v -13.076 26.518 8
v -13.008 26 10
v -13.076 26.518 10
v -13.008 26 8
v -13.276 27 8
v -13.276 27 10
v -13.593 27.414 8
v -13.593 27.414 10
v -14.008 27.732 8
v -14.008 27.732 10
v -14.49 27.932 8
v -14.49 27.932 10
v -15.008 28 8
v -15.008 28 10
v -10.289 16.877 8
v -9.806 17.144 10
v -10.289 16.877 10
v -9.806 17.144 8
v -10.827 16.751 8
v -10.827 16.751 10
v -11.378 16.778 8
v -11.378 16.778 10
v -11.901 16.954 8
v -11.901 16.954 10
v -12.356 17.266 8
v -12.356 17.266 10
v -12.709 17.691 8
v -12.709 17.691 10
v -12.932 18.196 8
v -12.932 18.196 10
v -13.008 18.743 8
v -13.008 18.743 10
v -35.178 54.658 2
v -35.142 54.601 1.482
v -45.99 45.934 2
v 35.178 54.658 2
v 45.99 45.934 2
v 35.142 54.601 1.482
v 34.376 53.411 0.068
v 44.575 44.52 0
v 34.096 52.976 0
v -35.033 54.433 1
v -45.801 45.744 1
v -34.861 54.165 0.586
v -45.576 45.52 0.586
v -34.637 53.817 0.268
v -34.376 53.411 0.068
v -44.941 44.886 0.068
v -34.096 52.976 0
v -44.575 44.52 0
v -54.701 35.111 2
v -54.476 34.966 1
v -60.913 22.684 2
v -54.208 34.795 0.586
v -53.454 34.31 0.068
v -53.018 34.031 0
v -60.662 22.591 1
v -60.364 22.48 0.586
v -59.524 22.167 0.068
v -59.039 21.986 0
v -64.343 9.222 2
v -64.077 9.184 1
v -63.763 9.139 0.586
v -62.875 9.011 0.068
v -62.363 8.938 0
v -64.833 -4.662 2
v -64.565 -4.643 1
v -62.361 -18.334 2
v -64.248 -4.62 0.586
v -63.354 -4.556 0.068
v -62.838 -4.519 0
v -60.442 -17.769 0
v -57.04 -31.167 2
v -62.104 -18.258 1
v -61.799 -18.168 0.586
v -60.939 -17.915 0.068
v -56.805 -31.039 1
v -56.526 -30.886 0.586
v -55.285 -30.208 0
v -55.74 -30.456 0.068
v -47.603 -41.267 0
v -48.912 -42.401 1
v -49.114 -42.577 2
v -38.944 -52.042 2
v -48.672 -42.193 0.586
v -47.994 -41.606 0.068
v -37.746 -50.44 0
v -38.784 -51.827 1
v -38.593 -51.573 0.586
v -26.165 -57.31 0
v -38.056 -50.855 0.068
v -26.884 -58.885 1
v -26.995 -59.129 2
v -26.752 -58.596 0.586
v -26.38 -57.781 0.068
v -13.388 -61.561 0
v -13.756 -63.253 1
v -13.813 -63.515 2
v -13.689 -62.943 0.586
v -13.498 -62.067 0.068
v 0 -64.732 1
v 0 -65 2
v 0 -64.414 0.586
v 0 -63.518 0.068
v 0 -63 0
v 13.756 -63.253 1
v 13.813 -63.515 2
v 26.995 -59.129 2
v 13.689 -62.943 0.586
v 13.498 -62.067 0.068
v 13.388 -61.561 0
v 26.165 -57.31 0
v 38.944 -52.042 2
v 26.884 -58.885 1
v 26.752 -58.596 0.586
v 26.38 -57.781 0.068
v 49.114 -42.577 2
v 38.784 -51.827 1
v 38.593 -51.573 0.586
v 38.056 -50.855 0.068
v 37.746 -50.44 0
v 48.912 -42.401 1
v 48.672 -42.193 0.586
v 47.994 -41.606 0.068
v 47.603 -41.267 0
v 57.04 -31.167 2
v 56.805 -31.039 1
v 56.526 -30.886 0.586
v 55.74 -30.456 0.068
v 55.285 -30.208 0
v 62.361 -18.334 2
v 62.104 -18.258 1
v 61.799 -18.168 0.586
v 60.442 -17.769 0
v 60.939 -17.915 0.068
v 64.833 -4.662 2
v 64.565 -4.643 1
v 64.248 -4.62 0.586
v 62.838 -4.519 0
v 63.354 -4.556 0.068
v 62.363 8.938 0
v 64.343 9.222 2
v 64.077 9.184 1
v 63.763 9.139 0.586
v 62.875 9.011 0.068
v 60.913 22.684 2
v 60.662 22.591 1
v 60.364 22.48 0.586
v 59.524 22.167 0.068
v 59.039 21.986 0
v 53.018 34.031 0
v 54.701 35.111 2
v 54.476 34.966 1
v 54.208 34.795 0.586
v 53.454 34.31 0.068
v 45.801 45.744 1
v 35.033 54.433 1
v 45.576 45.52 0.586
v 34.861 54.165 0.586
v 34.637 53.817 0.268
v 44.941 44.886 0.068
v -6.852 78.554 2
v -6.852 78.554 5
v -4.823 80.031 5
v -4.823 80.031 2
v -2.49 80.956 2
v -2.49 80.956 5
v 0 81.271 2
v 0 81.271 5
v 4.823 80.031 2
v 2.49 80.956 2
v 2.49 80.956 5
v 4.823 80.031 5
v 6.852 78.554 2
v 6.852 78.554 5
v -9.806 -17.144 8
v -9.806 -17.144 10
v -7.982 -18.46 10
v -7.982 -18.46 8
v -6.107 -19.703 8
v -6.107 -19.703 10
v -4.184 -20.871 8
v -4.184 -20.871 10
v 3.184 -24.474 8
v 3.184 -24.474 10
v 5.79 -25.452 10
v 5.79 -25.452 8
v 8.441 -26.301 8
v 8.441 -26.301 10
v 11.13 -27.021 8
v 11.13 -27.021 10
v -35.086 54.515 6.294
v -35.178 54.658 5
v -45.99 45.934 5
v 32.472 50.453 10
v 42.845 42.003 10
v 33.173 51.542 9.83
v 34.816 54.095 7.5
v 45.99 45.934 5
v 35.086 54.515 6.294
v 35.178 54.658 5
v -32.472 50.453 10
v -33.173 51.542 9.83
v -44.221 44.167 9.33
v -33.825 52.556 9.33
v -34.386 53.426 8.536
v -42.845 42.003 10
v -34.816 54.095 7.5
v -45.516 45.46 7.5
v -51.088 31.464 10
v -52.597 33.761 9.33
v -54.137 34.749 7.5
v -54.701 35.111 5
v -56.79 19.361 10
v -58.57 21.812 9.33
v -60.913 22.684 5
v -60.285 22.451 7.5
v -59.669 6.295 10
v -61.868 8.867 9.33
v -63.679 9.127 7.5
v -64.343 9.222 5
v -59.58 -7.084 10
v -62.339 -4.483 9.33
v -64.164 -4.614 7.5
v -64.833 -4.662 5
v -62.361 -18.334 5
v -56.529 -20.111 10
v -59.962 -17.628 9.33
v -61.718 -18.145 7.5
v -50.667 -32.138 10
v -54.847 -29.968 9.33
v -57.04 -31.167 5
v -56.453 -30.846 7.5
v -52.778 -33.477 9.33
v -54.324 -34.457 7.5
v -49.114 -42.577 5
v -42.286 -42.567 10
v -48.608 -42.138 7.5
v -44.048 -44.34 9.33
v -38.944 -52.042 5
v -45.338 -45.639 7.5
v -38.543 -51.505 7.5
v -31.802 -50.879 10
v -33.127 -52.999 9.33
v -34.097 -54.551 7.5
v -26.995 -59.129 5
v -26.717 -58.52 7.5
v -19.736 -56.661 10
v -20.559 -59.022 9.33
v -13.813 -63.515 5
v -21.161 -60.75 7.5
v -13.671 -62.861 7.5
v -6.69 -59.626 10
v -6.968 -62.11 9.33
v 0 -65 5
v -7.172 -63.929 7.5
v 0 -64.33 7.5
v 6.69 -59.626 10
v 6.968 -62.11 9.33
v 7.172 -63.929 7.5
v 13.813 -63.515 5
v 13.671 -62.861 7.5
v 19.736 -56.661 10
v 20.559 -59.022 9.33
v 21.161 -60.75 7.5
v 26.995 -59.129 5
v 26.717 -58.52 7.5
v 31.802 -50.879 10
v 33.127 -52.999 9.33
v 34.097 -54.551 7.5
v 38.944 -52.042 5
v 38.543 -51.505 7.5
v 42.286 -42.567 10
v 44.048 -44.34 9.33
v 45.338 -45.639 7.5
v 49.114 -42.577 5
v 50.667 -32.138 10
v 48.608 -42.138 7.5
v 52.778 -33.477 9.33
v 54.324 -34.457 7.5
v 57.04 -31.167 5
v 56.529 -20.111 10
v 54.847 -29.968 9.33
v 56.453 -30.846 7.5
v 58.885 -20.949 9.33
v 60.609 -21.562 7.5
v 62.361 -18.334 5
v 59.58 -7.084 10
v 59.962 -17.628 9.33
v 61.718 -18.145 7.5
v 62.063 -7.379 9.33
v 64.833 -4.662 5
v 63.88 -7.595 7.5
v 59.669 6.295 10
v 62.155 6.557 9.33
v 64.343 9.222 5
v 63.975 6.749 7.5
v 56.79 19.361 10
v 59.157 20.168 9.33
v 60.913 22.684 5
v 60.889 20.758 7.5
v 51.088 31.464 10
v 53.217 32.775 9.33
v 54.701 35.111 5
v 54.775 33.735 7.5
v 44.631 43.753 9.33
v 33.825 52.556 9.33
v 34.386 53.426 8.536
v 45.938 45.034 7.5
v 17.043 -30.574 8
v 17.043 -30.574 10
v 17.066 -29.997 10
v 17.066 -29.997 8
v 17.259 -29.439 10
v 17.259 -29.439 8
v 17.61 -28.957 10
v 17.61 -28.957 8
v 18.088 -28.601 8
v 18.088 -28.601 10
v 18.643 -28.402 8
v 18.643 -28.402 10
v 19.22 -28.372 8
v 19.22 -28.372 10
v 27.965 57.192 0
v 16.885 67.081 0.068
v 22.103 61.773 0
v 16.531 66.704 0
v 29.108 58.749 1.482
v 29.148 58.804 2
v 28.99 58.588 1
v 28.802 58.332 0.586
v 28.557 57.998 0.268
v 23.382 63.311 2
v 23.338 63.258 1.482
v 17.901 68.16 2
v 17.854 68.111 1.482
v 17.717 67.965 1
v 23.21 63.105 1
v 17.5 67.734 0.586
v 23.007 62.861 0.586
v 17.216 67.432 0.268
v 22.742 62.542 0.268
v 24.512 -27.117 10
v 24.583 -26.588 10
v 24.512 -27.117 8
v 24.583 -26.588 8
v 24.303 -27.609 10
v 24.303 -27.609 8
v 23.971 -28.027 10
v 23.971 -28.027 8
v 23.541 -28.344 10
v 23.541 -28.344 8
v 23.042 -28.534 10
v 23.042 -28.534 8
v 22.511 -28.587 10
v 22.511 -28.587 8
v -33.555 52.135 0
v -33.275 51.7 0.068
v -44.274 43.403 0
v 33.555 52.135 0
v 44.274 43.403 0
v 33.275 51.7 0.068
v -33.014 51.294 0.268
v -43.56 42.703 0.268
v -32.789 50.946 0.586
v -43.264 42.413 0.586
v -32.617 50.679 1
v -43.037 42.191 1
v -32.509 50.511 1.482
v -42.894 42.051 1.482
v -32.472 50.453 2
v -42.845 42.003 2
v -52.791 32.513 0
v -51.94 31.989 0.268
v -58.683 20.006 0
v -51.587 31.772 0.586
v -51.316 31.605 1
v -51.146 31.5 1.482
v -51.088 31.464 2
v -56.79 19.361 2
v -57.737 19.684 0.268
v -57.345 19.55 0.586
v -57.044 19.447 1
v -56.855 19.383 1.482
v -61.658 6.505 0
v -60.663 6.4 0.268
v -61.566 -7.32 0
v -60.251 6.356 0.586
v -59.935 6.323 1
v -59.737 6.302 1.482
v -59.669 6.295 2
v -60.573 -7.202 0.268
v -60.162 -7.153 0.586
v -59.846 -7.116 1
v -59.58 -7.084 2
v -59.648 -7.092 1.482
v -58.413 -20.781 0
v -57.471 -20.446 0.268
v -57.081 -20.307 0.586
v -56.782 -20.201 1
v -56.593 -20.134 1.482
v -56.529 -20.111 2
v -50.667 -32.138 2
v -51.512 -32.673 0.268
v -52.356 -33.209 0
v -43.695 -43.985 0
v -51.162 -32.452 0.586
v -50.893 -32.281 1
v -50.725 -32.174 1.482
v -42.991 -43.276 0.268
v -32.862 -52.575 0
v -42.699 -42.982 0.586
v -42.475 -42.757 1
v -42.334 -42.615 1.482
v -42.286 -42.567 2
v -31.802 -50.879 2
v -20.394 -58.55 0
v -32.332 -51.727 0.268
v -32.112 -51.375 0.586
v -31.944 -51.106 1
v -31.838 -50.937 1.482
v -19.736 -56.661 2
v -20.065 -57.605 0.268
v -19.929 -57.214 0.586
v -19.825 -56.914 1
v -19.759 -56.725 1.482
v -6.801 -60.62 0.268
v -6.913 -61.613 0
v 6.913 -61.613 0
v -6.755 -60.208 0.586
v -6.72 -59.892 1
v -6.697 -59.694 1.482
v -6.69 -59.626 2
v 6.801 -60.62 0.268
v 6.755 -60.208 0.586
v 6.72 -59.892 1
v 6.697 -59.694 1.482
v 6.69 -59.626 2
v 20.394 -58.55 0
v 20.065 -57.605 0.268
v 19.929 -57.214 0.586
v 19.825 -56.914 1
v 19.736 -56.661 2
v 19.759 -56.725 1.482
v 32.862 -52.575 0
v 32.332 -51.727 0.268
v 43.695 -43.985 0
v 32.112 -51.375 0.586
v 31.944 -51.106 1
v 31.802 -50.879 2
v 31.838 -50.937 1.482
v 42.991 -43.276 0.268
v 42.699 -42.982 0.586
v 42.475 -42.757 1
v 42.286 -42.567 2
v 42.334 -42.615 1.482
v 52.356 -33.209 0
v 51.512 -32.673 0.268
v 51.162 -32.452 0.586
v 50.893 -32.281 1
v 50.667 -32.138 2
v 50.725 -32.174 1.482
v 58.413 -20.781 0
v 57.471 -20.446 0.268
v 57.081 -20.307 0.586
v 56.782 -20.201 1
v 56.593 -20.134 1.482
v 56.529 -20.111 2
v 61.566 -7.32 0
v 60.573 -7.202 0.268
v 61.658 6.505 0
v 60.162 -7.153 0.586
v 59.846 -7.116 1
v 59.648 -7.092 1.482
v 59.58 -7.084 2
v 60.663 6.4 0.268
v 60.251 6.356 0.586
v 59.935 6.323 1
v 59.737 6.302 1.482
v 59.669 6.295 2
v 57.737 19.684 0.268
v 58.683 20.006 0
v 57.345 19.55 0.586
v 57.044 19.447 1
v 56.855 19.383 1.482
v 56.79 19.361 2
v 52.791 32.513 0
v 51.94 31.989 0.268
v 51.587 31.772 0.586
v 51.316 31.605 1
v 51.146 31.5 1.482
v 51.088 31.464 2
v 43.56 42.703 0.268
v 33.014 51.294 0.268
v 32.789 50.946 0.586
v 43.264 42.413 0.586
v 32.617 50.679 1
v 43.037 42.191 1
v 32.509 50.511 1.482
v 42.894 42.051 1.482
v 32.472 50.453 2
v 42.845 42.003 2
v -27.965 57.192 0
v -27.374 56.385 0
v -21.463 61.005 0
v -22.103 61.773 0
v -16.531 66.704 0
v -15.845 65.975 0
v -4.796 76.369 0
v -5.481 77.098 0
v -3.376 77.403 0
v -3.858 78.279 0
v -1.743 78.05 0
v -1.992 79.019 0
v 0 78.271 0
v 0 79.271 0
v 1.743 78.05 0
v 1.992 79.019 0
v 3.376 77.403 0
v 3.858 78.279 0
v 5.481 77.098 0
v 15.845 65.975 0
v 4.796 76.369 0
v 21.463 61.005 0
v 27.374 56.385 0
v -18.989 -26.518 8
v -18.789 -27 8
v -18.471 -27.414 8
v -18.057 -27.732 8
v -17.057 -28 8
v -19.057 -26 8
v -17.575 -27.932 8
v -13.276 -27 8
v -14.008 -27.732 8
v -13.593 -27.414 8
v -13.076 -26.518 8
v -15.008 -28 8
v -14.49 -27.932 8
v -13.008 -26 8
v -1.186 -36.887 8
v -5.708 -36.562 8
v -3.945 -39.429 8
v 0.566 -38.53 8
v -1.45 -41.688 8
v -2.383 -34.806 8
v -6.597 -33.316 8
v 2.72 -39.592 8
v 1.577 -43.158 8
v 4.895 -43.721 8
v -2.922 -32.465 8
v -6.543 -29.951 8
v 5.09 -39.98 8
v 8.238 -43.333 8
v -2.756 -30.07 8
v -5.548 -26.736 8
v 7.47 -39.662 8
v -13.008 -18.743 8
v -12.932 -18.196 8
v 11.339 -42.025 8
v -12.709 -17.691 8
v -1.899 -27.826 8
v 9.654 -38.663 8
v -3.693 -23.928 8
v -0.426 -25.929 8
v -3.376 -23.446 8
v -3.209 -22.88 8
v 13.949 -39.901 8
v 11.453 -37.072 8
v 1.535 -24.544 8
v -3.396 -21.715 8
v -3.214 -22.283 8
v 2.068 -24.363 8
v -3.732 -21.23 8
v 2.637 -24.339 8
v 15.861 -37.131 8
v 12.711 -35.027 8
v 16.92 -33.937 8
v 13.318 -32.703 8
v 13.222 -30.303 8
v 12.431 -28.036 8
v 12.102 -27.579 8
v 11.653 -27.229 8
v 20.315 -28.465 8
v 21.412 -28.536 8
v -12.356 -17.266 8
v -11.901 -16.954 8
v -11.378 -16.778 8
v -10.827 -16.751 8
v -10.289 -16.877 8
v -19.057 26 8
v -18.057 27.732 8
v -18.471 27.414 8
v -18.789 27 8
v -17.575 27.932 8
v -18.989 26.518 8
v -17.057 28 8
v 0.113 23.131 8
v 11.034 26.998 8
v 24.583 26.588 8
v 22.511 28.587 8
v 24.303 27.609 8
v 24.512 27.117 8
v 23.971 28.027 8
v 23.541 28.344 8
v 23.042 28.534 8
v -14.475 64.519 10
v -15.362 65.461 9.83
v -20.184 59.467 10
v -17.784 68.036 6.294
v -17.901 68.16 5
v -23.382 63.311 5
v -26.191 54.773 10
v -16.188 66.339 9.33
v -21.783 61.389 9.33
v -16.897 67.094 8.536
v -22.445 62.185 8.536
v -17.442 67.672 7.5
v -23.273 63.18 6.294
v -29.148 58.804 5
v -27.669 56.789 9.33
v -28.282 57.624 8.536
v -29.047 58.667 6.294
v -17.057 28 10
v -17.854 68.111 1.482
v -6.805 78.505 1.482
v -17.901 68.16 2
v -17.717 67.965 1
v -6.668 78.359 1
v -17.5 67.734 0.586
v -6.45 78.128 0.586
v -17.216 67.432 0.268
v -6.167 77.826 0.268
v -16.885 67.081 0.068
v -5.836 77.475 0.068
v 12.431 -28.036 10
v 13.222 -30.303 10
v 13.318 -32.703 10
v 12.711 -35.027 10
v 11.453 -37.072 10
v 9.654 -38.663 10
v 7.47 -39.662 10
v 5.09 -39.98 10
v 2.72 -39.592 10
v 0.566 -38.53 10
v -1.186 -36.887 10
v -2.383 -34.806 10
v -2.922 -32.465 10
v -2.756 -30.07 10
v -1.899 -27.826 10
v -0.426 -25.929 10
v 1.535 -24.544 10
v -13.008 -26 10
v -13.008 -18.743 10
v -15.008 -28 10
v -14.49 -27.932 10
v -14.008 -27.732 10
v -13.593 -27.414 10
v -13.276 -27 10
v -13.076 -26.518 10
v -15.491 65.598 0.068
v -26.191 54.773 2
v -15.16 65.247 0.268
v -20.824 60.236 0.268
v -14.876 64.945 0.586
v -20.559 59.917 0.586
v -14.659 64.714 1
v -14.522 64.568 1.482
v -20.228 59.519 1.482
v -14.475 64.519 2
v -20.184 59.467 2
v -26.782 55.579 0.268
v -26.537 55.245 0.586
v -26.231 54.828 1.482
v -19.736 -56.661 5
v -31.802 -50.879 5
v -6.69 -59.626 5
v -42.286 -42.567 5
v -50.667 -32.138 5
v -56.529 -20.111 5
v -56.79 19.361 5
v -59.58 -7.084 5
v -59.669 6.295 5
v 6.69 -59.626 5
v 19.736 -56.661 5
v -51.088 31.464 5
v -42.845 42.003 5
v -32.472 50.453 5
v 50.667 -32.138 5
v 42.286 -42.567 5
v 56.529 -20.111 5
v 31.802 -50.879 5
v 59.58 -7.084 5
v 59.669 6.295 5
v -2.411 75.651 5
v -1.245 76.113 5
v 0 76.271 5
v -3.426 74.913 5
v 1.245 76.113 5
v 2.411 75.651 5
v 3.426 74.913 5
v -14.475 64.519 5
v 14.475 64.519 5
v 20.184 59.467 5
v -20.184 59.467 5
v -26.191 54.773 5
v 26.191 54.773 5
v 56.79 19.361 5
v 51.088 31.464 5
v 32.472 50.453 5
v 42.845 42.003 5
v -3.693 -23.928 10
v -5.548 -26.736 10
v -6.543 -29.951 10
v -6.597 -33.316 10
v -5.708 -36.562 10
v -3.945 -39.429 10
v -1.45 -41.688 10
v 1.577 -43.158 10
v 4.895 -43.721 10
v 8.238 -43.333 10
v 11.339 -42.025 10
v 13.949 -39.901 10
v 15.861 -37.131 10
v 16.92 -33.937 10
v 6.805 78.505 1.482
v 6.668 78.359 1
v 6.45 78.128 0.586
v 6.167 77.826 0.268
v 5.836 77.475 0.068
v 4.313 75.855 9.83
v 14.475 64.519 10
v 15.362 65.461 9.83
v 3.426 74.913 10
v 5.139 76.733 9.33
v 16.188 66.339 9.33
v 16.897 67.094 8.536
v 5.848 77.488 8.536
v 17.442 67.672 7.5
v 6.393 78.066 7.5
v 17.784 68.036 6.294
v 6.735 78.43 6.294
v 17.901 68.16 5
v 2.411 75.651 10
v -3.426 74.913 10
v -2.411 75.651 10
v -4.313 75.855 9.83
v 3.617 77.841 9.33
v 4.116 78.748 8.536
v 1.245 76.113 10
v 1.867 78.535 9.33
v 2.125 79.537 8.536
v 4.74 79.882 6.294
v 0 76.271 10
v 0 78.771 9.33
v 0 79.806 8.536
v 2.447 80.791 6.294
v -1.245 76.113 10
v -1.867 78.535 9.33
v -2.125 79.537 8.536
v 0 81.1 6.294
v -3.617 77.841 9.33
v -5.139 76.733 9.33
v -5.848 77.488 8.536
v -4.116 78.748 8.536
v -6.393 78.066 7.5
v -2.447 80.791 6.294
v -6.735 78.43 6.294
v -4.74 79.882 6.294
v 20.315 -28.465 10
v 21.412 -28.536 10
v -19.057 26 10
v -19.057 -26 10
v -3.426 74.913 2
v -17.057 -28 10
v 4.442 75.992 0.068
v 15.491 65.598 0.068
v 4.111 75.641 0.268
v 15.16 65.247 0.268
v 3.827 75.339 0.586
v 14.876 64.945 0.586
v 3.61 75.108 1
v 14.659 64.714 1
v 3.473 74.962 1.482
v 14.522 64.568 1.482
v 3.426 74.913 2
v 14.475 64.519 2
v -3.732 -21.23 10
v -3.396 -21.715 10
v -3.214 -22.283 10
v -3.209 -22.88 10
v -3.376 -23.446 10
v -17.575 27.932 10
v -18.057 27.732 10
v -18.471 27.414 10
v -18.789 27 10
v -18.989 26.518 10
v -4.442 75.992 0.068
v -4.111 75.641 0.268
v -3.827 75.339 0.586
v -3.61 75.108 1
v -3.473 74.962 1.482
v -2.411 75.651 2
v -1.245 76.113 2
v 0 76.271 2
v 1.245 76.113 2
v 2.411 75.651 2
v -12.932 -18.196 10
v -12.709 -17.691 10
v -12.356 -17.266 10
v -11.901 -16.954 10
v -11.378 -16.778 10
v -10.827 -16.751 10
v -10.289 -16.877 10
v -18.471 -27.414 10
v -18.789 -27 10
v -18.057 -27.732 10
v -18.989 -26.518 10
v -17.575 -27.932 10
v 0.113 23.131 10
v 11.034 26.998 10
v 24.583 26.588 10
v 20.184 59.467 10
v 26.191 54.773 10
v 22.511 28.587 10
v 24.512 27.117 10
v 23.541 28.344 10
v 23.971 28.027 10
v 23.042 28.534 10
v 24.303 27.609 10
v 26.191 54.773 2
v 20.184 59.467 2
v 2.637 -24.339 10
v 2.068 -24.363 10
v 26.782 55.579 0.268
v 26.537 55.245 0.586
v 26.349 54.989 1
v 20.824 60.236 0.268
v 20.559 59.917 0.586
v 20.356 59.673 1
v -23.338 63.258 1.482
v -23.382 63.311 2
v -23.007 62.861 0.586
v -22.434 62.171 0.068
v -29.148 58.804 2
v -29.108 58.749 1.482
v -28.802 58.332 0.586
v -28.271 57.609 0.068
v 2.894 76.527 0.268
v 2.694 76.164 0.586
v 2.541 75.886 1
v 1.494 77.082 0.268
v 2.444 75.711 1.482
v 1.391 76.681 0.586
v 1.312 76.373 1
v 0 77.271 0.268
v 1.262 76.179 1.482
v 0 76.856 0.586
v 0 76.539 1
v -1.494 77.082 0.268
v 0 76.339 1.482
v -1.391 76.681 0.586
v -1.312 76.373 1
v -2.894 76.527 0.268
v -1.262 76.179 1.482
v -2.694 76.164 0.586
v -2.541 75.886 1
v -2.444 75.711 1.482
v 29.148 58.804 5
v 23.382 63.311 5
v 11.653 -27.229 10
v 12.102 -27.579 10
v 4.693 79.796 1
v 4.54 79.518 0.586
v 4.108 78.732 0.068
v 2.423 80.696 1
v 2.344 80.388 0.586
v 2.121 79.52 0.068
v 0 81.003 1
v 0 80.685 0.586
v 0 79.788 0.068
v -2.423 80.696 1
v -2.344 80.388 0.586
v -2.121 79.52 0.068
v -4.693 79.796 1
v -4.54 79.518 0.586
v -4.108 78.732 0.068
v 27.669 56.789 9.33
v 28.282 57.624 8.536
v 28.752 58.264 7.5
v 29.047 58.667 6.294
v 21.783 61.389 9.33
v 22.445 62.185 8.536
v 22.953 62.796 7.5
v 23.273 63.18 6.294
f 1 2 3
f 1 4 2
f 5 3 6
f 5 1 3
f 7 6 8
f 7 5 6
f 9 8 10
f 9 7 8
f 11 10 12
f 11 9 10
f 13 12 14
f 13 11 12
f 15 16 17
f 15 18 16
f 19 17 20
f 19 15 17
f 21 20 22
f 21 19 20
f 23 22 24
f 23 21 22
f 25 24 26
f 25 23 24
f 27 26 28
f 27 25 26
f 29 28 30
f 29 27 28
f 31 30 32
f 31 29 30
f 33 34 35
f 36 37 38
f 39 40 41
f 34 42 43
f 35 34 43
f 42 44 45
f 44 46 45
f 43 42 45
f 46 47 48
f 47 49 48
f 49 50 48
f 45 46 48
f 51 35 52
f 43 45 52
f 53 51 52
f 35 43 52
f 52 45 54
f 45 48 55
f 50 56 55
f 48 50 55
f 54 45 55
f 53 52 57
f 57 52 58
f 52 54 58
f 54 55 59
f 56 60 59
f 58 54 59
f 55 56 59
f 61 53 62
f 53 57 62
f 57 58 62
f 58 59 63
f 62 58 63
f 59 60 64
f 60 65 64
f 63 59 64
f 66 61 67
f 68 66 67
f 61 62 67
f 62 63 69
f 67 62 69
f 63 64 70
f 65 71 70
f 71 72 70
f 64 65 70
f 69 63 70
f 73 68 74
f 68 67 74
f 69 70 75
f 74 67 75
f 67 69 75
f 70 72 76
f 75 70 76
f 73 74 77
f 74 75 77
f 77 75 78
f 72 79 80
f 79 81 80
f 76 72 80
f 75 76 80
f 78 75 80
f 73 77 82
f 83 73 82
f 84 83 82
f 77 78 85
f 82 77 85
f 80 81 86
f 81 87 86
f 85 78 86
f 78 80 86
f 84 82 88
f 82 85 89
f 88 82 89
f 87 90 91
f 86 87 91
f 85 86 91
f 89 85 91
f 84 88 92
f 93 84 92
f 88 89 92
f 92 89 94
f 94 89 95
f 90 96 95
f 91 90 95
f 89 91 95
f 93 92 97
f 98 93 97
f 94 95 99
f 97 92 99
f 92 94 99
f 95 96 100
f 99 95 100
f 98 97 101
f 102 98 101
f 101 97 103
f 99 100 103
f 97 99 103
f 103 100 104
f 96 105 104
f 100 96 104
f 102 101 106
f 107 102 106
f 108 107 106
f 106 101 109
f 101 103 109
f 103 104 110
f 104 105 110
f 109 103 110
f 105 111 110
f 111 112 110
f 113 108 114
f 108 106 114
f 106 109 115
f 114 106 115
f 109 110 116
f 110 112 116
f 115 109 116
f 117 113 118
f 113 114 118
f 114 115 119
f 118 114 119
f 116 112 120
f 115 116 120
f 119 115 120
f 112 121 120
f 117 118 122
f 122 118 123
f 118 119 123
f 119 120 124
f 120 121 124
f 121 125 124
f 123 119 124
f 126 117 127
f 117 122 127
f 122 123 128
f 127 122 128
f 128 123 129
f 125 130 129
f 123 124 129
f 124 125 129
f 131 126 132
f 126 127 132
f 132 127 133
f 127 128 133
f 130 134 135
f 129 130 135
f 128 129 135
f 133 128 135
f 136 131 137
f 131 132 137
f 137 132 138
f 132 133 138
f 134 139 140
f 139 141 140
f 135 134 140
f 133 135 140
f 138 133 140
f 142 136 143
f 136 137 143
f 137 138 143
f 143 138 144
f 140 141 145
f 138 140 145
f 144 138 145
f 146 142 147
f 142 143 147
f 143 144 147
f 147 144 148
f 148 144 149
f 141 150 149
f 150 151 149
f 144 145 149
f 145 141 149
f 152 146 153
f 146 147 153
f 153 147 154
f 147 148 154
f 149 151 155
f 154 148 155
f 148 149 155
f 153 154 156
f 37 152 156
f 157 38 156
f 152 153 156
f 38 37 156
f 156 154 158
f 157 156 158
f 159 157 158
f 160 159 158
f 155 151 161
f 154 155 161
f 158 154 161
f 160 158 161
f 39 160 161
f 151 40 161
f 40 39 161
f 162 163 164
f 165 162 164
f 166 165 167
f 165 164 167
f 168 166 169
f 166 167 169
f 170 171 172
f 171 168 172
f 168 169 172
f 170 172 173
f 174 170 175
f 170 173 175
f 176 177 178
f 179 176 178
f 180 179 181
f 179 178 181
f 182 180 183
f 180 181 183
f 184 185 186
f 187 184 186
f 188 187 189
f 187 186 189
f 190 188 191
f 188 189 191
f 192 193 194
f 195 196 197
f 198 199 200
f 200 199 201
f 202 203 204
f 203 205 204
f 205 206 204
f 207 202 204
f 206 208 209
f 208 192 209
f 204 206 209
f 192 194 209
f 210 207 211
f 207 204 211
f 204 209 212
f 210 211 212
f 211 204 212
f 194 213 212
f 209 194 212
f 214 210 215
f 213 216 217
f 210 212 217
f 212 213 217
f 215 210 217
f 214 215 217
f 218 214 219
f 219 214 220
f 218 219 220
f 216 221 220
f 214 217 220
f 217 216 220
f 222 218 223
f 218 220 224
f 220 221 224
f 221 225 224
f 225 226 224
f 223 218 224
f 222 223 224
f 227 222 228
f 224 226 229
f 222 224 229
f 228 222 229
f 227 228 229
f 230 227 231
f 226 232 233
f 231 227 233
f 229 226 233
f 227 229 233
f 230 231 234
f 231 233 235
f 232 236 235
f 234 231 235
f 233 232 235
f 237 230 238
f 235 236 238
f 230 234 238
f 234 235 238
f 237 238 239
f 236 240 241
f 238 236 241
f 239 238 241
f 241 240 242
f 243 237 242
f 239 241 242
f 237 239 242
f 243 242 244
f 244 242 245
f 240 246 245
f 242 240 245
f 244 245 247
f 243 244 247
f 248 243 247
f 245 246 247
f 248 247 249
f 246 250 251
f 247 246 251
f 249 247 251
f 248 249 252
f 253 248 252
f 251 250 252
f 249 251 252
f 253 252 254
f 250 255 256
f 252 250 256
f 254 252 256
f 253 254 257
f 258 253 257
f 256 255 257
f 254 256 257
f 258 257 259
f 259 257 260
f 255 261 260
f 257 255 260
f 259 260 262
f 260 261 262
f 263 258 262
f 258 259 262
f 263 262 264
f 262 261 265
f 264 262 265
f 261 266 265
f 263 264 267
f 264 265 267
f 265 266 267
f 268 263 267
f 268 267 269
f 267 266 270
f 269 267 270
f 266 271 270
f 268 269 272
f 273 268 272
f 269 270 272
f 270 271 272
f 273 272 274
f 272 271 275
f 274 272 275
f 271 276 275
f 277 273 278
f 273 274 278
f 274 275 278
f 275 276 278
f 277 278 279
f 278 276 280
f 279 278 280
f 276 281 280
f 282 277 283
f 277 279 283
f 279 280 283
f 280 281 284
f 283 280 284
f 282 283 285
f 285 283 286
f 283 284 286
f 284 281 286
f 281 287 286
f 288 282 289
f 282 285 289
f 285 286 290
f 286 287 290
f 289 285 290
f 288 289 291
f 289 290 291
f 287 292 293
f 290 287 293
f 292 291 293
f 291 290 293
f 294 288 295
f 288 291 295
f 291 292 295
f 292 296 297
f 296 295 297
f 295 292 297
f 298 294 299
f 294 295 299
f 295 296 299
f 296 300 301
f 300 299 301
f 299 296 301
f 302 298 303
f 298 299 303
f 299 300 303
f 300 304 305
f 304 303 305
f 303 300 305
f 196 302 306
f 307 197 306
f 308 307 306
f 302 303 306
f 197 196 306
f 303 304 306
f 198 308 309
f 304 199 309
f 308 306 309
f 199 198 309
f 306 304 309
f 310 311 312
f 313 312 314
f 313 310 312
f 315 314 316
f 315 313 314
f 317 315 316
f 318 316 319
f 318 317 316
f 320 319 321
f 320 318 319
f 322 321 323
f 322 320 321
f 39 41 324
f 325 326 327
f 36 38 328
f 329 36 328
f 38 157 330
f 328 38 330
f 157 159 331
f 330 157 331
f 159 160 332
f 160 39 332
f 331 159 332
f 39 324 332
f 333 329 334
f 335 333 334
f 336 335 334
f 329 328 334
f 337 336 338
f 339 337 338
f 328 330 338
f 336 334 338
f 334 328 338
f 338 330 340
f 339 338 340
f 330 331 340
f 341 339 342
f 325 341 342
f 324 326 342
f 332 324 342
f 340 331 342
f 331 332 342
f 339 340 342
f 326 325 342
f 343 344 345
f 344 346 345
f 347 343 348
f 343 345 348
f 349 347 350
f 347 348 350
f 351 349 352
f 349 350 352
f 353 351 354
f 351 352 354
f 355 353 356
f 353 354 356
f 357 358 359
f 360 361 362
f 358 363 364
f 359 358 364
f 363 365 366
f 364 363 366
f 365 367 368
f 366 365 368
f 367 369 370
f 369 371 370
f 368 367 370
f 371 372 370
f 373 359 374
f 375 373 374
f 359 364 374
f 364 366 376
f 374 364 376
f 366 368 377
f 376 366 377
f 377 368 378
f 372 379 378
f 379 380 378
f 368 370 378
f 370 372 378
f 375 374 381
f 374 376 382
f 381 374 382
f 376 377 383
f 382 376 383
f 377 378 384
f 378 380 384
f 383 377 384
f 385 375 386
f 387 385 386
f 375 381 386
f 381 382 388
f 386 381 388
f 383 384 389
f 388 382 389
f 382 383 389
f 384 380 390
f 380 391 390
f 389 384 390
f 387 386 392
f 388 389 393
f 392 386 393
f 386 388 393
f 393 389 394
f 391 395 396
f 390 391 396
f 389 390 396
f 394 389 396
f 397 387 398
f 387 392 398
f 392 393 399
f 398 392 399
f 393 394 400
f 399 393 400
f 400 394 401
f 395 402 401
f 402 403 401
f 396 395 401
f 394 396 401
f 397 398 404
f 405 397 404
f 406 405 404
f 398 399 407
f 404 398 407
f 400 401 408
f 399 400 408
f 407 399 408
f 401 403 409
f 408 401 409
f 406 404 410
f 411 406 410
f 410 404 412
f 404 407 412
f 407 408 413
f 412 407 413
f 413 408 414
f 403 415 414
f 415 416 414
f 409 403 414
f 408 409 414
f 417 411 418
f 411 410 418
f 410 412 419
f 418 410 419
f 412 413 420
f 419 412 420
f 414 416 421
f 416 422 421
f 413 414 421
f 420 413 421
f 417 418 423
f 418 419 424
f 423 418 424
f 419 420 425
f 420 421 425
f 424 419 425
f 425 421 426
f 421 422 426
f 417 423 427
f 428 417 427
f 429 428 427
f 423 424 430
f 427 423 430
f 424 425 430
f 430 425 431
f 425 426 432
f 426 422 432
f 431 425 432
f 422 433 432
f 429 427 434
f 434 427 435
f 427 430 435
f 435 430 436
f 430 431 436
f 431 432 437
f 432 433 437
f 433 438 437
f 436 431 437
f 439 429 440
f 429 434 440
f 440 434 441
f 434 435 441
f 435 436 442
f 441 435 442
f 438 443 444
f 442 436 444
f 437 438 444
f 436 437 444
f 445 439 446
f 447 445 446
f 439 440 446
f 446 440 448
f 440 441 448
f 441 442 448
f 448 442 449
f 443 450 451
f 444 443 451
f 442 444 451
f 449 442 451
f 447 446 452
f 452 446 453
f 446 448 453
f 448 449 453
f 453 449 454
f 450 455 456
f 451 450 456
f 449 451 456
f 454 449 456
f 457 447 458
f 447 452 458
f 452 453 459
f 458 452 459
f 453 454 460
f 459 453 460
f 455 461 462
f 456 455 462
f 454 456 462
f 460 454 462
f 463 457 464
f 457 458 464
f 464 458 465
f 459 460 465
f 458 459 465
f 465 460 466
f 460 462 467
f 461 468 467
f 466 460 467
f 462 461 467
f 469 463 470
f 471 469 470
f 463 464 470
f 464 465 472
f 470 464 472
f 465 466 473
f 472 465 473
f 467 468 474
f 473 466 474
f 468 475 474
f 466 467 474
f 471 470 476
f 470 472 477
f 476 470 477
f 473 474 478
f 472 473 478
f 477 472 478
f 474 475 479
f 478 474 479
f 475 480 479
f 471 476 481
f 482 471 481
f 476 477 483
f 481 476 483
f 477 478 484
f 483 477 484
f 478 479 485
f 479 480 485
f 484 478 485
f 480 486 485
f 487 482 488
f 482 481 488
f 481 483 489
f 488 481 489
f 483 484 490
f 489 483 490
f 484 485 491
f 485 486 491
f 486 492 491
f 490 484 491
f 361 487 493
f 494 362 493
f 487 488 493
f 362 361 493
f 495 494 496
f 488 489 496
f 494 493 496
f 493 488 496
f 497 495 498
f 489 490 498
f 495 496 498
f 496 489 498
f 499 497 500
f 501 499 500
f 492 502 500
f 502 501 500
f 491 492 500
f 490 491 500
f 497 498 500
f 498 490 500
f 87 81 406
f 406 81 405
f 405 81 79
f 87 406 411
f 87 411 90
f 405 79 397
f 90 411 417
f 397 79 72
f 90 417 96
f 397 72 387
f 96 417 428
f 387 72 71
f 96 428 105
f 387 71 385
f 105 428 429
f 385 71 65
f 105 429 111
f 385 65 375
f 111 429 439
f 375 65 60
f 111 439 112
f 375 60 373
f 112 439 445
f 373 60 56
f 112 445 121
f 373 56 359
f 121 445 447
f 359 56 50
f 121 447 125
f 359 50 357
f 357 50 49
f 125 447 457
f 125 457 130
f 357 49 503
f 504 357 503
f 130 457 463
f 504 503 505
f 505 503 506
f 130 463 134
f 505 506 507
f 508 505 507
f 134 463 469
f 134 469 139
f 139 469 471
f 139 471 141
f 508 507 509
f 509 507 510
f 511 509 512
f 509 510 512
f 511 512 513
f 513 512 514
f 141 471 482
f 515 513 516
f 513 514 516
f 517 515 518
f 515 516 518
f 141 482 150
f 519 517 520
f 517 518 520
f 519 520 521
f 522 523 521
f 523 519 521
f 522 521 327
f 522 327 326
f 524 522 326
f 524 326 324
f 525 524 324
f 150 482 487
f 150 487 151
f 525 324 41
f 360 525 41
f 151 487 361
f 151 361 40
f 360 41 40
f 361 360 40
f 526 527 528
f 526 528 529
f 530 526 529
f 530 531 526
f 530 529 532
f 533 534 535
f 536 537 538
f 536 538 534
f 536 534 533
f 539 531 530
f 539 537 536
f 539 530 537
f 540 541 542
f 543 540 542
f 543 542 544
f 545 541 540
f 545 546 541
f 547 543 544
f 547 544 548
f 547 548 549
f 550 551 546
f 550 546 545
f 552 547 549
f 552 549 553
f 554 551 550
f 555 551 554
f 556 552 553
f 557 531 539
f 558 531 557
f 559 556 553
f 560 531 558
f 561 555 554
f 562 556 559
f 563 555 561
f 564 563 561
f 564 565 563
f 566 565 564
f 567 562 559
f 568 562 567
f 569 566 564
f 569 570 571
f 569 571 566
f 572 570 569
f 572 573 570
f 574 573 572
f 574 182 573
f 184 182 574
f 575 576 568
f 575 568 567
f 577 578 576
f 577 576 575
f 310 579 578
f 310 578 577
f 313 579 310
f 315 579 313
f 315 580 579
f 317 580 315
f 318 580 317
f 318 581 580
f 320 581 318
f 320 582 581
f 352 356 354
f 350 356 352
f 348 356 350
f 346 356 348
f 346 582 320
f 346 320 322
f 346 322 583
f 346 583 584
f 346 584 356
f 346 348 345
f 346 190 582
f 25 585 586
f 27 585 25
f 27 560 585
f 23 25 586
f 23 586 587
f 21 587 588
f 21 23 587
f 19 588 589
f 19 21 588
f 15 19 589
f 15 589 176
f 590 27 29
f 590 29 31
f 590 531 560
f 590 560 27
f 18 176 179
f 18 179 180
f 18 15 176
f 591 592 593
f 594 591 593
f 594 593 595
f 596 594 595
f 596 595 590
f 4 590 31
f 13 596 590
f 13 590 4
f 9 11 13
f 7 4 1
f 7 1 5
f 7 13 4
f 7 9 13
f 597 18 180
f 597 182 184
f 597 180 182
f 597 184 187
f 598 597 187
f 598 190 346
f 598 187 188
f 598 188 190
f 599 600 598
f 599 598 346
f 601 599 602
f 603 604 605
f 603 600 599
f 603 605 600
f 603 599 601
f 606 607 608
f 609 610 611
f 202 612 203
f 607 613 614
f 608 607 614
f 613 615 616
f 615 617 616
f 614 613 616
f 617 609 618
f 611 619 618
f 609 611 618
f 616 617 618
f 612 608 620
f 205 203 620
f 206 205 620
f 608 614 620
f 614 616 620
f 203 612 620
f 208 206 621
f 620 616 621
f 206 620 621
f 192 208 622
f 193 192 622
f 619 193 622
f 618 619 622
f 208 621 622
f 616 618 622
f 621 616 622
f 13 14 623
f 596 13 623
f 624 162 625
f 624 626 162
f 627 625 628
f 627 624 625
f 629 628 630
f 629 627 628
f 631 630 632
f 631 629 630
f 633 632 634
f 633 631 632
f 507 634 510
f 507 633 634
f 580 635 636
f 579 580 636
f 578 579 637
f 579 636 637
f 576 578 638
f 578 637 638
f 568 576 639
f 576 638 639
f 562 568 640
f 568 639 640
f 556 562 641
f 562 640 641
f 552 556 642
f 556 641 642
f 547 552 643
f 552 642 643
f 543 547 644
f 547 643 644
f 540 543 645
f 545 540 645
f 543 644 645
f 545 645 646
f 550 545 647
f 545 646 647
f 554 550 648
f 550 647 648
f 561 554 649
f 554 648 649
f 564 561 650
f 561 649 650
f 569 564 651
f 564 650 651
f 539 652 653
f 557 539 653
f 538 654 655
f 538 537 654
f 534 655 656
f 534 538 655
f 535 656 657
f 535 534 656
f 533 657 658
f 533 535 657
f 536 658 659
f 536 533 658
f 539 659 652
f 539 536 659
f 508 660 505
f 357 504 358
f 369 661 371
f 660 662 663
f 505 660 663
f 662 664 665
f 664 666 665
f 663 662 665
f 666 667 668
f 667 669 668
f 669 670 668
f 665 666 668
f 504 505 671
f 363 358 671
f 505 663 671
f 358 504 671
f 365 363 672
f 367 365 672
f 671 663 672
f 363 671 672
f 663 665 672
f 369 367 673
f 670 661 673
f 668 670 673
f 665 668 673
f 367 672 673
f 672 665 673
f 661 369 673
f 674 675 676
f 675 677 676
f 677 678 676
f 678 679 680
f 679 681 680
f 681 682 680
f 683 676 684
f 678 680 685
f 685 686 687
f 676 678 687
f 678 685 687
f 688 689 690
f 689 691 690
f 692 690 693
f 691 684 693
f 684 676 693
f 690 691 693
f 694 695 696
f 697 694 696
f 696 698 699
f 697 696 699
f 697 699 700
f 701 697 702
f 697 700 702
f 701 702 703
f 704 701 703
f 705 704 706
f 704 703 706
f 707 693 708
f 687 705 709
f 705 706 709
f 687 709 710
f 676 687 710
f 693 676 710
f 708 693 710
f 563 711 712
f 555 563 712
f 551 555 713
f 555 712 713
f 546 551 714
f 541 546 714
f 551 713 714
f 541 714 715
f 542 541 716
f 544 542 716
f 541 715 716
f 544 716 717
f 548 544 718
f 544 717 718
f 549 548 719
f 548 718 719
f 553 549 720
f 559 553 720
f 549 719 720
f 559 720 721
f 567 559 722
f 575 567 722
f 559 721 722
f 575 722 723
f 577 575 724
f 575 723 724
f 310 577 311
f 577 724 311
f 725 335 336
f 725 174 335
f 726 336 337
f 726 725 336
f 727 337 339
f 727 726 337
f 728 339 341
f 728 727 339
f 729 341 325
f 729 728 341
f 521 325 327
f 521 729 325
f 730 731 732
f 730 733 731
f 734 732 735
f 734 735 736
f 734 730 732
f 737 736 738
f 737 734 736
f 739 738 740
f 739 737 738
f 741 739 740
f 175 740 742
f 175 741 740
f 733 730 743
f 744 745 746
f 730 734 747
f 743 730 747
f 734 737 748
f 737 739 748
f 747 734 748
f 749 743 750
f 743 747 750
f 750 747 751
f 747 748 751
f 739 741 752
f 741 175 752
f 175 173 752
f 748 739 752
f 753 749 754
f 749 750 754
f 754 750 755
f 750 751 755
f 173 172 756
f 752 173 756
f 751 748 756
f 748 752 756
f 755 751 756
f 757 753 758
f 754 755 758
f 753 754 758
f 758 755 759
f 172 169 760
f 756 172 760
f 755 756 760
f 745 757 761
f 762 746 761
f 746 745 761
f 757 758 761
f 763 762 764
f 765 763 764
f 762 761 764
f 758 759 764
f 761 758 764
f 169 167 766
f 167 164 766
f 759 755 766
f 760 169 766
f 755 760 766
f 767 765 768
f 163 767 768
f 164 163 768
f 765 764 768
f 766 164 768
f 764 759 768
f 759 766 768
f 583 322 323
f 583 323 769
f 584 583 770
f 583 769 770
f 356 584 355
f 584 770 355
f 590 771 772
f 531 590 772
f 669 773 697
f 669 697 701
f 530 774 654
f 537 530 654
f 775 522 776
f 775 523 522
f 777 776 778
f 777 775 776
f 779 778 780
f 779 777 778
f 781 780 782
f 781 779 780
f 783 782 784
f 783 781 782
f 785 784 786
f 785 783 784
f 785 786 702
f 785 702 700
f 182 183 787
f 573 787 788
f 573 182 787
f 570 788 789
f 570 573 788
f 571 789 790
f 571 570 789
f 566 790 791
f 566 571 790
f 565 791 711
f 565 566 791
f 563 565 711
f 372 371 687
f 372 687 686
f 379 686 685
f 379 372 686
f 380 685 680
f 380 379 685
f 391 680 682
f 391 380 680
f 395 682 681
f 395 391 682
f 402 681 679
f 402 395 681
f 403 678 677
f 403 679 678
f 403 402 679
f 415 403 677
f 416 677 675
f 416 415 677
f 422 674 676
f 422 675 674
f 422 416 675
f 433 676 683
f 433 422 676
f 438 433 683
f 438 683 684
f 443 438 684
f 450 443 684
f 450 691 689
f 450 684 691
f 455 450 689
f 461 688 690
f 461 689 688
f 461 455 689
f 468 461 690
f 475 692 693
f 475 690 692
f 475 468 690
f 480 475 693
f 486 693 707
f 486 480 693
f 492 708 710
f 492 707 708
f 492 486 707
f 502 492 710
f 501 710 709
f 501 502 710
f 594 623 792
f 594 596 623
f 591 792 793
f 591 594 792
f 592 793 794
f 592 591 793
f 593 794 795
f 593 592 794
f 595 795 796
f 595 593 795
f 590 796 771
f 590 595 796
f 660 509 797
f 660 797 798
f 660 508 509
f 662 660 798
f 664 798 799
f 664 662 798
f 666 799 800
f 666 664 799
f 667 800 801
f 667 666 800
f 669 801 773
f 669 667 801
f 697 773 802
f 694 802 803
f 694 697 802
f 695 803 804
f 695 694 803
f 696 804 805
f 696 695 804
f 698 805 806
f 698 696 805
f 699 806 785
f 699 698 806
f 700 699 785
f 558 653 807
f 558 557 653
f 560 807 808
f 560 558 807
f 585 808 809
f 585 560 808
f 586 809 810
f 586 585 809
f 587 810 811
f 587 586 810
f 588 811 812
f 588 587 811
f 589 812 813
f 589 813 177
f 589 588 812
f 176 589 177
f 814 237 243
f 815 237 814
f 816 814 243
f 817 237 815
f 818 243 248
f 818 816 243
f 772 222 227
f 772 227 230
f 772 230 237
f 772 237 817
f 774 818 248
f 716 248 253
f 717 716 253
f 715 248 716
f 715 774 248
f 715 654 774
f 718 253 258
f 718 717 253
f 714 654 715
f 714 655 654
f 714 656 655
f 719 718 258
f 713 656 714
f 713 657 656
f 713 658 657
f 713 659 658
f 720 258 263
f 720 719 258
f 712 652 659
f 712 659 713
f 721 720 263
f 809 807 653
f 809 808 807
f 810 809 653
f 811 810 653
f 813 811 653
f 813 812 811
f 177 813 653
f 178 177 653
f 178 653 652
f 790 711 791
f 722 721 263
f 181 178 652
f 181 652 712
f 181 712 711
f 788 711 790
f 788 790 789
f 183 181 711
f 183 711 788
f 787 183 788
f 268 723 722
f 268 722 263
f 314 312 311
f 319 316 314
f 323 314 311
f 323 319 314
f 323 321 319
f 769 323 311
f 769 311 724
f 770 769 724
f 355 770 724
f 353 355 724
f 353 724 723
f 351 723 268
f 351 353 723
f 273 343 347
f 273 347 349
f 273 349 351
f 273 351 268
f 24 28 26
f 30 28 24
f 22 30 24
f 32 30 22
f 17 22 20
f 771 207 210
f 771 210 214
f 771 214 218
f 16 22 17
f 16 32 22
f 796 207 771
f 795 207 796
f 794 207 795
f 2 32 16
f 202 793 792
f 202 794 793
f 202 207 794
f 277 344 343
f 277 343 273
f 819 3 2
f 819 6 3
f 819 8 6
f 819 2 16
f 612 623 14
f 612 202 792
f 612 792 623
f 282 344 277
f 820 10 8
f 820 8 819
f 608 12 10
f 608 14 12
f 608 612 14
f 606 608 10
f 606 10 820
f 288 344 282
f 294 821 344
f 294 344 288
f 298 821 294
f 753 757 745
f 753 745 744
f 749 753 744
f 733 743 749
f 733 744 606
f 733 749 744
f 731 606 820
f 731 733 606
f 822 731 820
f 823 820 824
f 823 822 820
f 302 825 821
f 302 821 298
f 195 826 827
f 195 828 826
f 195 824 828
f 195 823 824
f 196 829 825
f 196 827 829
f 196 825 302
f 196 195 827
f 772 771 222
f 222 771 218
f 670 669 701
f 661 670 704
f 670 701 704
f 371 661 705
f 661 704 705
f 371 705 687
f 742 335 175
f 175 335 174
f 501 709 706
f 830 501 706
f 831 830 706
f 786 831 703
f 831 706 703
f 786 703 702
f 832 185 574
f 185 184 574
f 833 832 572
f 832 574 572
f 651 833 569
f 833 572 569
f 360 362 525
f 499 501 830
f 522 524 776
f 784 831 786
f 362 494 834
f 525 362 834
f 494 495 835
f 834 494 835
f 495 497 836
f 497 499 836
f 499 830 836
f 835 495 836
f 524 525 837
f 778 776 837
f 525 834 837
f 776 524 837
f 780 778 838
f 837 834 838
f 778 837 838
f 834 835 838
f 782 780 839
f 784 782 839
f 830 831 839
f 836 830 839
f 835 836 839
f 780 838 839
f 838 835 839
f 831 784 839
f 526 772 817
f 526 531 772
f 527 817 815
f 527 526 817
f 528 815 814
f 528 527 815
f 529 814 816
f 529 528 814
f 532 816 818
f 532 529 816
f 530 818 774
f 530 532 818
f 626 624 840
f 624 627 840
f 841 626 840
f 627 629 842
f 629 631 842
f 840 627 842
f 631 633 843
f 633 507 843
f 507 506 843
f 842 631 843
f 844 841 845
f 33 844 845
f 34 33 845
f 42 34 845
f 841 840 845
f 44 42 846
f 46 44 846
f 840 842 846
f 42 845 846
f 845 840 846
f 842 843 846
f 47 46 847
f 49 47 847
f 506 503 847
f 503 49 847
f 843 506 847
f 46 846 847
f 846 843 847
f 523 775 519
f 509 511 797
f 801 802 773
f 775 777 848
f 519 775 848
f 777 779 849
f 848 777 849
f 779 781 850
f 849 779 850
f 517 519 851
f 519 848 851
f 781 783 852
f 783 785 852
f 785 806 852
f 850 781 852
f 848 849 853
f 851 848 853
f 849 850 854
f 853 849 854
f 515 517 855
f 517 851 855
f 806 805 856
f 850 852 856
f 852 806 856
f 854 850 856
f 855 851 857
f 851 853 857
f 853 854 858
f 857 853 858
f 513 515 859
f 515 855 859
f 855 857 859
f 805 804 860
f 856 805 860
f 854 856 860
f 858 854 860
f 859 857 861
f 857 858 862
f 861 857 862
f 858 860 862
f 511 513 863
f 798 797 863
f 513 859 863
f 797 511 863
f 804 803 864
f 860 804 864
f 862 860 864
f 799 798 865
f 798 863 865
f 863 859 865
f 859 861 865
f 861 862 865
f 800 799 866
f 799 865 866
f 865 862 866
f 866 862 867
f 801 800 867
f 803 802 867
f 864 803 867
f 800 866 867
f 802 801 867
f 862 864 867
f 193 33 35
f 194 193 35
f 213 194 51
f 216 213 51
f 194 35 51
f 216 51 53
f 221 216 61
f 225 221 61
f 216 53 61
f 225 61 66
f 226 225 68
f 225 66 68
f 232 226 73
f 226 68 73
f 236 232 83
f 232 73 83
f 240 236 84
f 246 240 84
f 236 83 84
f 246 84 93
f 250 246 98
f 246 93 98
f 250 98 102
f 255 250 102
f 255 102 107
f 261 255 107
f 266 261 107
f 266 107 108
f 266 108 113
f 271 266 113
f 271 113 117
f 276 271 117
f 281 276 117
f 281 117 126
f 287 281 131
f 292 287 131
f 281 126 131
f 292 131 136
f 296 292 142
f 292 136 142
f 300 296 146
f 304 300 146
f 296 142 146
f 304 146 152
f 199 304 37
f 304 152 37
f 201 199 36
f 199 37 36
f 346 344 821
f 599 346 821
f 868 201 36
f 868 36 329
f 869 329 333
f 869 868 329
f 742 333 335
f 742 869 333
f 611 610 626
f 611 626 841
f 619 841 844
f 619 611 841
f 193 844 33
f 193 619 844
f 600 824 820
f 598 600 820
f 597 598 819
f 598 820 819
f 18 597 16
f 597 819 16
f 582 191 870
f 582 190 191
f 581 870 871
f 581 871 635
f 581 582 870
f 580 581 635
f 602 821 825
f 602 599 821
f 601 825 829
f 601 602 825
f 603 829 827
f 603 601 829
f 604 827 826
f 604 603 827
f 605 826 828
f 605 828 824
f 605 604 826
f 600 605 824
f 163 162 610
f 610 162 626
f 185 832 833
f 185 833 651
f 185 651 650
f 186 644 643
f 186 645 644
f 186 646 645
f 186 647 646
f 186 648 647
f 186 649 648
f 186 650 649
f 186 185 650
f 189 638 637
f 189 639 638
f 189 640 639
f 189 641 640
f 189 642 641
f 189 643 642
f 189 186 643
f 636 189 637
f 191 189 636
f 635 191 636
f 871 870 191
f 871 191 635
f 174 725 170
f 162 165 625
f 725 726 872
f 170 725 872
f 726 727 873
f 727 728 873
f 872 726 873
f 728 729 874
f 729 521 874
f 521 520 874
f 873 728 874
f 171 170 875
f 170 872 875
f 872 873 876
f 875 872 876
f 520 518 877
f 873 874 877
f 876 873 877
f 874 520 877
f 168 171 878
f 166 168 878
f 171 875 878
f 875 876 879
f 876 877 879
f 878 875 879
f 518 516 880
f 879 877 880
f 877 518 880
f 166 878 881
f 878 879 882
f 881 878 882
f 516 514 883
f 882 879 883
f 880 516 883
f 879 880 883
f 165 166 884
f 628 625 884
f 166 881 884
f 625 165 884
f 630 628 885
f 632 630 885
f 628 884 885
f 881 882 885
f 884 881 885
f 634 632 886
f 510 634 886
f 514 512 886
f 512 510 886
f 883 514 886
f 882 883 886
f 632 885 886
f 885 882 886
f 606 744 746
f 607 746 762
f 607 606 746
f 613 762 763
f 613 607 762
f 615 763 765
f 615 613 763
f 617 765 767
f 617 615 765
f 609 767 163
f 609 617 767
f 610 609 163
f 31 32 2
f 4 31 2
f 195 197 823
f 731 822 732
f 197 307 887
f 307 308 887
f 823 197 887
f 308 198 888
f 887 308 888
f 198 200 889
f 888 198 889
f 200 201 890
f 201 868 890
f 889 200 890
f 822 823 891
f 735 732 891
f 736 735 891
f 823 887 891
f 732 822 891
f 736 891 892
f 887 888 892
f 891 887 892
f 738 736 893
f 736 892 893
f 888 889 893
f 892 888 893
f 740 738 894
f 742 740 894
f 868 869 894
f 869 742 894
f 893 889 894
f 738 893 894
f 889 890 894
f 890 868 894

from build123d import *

# Parameters (mm, degrees)
F1_DEPTH = 10
F2_R     = 10
F3_R     = 120
F4_T     = -5
F5_R     = 5
F7_DEPTH = 2
F8_R     = 2
F9_R     = 2


with BuildPart() as f1:
    # F0 (on Top) → F1 (new body)
    with BuildSketch(Plane.XY):
        with BuildLine():
            Line((0, 85), (-28, 58.6600375042))
            ThreePointArc((-28, 58.6600375042), (0, -65), (28, 58.6600375042))
            Line((28, 58.6600375042), (0, 85))
        make_face()
    extrude(amount=F1_DEPTH)

    # F2
    f2_edges = [f1.edges().sort_by_distance(p)[0] for p in [
        (0, 85, 5),
    ]]
    fillet(f2_edges, radius=F2_R)

    # F3
    f3_edges = [f1.edges().sort_by_distance(p)[0] for p in [
        (-28, 58.660038, 5),
        (28, 58.660038, 5),
    ]]
    fillet(f3_edges, radius=F3_R)

    # F4
    f4_openings = [f1.faces().sort_by_distance(p)[0] for p in [
        (0, 2.490227, 0),
    ]]
    offset(amount=F4_T, openings=f4_openings)

    # F5
    f5_edges = [f1.edges().sort_by_distance(p)[0] for p in [
        (0, -65, 10),
        (12.376367, 73.357391, 10),
        (26.230576, 61.013655, 10),
        (0, 81.270685, 10),
        (-12.376367, 73.357391, 10),
        (-26.230576, 61.013655, 10),
    ]]
    fillet(f5_edges, radius=F5_R)

    # F6 (on face) → F7 (cut)
    with BuildSketch(Plane.XY.offset(10)):
        with BuildLine():
            Line((24.5830141958, -28.6241205137), (24.5830141958, 28.6241205137))
            ThreePointArc((24.5830141958, 28.6241205137), (4.5140931022, 24.9911712124), (-13.0076974051, 14.5534141782))
            Line((-13.0076974051, 14.5534141782), (-13.0076974051, 28))
            Line((-13.0076974051, 28), (-19.0571866046, 28))
            Line((-19.0571866046, 28), (-19.0571866046, -28))
            Line((-19.0571866046, -28), (-13.0076974051, -28))
            Line((-13.0076974051, -28), (-13.0076974051, -14.5534141782))
            ThreePointArc((-13.0076974051, -14.5534141782), (-7.6208581173, -18.7073881119), (-1.7793276831, -22.1930816072))
            ThreePointArc((-1.7793276831, -22.1930816072), (1.5769915618, -43.1576186172), (16.4944786534, -28.0498302354))
            ThreePointArc((16.4944786534, -28.0498302354), (20.5285655112, -28.4803674588), (24.5830141958, -28.6241205137))
        make_face()
        with BuildLine():
            ThreePointArc((11.9329452437, -27.2089956114), (2.7197472284, -39.5920744788), (2.4211464703, -24.1604673852))
            ThreePointArc((2.4211464703, -24.1604673852), (7.1104323918, -25.8925740471), (11.9329452437, -27.2089956114))
        make_face(mode=Mode.SUBTRACT)
    extrude(amount=-F7_DEPTH, mode=Mode.SUBTRACT)

    # F8
    f8_edges = [f1.edges().sort_by_distance(p)[0] for p in [
        (-13.007697, 28, 9),
        (-19.057187, 28, 9),
        (-13.007697, 14.553414, 9),
        (24.583014, 28.624121, 9),
        (24.583014, -28.624121, 9),
        (16.494479, -28.04983, 9),
        (-1.779328, -22.193082, 9),
        (2.421146, -24.160467, 9),
        (11.932945, -27.208996, 9),
        (-13.007697, -14.553414, 9),
        (-13.007697, -28, 9),
        (-19.057187, -28, 9),
    ]]
    fillet(f8_edges, radius=F8_R)

    # F9
    f9_edges = [f1.edges().sort_by_distance(p)[0] for p in [
        (0, -65, 0),
        (-26.230576, 61.013655, 0),
        (26.230576, 61.013655, 0),
        (-12.376367, 73.357391, 0),
        (12.376367, 73.357391, 0),
        (0, 81.270685, 0),
        (8.950439, 69.715549, 0),
        (23.151719, 57.074031, 0),
        (0, -60, 0),
        (-23.151719, 57.074031, 0),
        (-8.950439, 69.715549, 0),
        (0, 76.270685, 0),
    ]]
    fillet(f9_edges, radius=F9_R)


solid = f1.part
